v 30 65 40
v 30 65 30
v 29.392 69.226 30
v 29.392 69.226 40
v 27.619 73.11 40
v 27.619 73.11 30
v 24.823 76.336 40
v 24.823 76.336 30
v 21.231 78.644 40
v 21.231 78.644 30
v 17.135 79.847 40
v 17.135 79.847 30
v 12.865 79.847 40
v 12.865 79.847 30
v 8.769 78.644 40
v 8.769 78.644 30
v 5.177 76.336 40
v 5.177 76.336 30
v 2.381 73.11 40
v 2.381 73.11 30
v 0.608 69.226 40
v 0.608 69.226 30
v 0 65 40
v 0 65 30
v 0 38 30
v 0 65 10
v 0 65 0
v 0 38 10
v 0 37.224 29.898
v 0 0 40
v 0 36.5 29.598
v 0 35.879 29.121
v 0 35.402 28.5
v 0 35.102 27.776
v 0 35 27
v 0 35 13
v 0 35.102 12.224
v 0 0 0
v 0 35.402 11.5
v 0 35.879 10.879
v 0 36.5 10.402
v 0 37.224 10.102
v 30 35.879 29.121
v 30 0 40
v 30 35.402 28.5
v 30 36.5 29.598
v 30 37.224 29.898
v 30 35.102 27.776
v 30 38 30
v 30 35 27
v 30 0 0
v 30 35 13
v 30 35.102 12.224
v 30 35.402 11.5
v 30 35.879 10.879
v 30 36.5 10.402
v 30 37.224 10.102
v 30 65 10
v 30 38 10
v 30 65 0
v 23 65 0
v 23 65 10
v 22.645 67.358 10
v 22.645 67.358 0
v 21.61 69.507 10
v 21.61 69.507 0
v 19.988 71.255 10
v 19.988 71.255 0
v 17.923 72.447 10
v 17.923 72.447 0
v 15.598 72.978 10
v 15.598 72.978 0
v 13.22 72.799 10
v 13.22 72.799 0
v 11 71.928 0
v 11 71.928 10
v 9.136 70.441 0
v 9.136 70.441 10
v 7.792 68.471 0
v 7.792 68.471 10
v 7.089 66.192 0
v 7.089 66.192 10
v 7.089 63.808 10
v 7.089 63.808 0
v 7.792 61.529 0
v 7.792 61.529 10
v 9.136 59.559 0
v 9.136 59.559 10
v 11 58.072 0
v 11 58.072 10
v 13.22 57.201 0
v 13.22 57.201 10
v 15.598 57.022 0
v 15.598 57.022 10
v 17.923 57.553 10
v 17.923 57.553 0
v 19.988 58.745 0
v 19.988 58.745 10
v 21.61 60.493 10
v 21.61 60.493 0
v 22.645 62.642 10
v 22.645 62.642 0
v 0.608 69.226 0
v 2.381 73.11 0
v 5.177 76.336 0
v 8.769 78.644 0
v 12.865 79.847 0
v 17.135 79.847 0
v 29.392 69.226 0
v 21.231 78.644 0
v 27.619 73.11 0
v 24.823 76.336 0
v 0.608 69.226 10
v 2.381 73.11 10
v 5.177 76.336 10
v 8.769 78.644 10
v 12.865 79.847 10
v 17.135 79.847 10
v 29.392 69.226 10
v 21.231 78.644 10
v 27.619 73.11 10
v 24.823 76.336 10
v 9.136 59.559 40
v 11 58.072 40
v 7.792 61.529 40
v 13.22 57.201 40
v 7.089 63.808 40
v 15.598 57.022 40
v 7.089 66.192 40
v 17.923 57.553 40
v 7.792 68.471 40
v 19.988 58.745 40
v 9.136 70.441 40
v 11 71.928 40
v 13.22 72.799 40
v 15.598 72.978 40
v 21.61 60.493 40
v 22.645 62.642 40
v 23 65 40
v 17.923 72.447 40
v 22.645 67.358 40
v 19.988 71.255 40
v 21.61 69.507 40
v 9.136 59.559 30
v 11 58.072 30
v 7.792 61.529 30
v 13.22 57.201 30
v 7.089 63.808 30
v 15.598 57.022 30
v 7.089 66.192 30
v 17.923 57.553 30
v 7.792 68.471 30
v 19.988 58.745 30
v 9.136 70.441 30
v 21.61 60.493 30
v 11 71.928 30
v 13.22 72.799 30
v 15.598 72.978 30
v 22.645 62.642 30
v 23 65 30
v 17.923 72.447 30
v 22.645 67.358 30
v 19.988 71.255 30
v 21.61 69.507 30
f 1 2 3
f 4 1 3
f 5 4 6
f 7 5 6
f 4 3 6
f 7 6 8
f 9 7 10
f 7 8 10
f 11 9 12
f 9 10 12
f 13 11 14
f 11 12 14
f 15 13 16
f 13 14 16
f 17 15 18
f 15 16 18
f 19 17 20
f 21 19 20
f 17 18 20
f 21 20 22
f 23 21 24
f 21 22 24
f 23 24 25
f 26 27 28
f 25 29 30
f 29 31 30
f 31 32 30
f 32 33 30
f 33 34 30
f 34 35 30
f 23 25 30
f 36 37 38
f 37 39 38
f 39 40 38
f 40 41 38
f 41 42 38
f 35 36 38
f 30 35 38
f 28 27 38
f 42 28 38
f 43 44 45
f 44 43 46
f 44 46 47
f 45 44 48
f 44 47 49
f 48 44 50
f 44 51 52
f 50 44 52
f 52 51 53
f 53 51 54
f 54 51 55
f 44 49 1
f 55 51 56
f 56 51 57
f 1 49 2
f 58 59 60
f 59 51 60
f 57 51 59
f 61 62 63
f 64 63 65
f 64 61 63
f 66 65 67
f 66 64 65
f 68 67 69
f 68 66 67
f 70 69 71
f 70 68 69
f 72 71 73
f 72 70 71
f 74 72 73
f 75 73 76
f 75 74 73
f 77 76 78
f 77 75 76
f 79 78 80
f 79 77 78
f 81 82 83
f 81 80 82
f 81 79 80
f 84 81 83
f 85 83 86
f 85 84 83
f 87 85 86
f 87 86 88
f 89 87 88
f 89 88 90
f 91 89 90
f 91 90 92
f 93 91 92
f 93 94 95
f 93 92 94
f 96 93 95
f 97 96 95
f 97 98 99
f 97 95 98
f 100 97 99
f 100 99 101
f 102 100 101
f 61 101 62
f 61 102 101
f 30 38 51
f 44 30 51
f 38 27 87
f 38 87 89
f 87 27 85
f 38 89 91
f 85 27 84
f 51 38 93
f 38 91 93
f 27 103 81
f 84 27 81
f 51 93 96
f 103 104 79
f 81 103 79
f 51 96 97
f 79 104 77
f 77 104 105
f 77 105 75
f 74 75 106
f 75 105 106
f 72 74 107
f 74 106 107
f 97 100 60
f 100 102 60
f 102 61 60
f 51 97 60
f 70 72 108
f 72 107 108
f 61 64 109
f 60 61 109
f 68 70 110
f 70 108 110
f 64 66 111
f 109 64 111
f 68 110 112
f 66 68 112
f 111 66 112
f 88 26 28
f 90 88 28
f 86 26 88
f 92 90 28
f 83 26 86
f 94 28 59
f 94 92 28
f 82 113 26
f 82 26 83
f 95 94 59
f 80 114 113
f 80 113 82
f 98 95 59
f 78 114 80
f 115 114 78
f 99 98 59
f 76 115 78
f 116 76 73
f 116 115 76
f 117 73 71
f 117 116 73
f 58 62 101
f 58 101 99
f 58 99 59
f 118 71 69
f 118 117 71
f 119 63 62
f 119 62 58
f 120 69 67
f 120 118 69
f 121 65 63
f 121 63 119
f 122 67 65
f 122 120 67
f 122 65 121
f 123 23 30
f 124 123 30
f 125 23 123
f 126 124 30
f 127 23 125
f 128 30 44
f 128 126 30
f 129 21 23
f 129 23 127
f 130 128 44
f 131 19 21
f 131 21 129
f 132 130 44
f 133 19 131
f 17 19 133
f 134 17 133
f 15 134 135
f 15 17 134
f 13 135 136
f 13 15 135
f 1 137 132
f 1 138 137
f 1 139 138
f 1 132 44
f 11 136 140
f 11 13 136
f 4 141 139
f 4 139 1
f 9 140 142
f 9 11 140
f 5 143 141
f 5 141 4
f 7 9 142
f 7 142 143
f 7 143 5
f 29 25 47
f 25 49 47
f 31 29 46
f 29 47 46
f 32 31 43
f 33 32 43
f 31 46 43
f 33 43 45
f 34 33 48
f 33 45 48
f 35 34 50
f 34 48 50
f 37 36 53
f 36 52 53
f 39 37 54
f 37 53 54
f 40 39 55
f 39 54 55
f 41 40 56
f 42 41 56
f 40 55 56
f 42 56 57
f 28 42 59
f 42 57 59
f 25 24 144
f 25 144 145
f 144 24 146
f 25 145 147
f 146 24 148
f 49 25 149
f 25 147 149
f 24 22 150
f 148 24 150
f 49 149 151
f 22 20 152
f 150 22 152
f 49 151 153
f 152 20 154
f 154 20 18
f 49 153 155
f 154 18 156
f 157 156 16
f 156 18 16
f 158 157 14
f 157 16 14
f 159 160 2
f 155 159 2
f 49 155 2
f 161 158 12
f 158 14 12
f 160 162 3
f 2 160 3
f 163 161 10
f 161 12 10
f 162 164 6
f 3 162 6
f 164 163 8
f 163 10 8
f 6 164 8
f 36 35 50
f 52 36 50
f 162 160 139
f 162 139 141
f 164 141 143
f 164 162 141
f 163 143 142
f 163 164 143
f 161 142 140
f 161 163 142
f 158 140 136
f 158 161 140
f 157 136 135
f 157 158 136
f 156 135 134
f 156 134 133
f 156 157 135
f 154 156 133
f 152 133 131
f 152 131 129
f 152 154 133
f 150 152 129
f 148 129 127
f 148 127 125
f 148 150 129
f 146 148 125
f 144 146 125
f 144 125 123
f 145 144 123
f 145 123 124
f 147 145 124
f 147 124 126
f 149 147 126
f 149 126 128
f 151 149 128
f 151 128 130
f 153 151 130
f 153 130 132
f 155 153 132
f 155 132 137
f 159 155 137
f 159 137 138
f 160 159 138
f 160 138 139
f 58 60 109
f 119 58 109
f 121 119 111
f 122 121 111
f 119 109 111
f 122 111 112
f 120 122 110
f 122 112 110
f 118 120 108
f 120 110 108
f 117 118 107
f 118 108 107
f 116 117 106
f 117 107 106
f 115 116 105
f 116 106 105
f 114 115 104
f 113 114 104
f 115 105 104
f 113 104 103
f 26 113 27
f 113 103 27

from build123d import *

# Parameters (mm, degrees)
SKETCH_1_R          = 8
EXTRUDE_1_DEPTH     = 40
CUT_EXTRUDE_START   = 20
SKETCH_2_W          = 30
SKETCH_2_H          = 45
CUT_EXTRUDE_1_DEPTH = 10
FILLET_1_R          = 3


with BuildPart() as part:
    # Эскиз1 → Бобышка-Вытянуть1 (new body)
    with BuildSketch(Plane.XY):
        with BuildLine():
            Line((0, 0), (30, 0))
            Line((30, 0), (30, 65))
            ThreePointArc((30, 65), (15, 80), (0, 65))
            Line((0, 65), (0, 0))
        make_face()
        with Locations((15, 65)):
            Circle(SKETCH_1_R, mode=Mode.SUBTRACT)
    extrude(amount=EXTRUDE_1_DEPTH)

    # Эскиз2 → Вырез-Вытянуть1 (cut, symmetric)
    with BuildSketch(Plane.XY.offset(CUT_EXTRUDE_START)):
        with Locations((15, 57.5)):
            Rectangle(SKETCH_2_W, SKETCH_2_H)
    extrude(amount=CUT_EXTRUDE_1_DEPTH, both=True, mode=Mode.SUBTRACT)

    # Скругление1
    fillet_1_edges = [part.edges().sort_by_distance(p)[0] for p in [
        (15, 35, 30),
        (15, 35, 10),
    ]]
    fillet(fillet_1_edges, radius=FILLET_1_R)


solid = part.part
